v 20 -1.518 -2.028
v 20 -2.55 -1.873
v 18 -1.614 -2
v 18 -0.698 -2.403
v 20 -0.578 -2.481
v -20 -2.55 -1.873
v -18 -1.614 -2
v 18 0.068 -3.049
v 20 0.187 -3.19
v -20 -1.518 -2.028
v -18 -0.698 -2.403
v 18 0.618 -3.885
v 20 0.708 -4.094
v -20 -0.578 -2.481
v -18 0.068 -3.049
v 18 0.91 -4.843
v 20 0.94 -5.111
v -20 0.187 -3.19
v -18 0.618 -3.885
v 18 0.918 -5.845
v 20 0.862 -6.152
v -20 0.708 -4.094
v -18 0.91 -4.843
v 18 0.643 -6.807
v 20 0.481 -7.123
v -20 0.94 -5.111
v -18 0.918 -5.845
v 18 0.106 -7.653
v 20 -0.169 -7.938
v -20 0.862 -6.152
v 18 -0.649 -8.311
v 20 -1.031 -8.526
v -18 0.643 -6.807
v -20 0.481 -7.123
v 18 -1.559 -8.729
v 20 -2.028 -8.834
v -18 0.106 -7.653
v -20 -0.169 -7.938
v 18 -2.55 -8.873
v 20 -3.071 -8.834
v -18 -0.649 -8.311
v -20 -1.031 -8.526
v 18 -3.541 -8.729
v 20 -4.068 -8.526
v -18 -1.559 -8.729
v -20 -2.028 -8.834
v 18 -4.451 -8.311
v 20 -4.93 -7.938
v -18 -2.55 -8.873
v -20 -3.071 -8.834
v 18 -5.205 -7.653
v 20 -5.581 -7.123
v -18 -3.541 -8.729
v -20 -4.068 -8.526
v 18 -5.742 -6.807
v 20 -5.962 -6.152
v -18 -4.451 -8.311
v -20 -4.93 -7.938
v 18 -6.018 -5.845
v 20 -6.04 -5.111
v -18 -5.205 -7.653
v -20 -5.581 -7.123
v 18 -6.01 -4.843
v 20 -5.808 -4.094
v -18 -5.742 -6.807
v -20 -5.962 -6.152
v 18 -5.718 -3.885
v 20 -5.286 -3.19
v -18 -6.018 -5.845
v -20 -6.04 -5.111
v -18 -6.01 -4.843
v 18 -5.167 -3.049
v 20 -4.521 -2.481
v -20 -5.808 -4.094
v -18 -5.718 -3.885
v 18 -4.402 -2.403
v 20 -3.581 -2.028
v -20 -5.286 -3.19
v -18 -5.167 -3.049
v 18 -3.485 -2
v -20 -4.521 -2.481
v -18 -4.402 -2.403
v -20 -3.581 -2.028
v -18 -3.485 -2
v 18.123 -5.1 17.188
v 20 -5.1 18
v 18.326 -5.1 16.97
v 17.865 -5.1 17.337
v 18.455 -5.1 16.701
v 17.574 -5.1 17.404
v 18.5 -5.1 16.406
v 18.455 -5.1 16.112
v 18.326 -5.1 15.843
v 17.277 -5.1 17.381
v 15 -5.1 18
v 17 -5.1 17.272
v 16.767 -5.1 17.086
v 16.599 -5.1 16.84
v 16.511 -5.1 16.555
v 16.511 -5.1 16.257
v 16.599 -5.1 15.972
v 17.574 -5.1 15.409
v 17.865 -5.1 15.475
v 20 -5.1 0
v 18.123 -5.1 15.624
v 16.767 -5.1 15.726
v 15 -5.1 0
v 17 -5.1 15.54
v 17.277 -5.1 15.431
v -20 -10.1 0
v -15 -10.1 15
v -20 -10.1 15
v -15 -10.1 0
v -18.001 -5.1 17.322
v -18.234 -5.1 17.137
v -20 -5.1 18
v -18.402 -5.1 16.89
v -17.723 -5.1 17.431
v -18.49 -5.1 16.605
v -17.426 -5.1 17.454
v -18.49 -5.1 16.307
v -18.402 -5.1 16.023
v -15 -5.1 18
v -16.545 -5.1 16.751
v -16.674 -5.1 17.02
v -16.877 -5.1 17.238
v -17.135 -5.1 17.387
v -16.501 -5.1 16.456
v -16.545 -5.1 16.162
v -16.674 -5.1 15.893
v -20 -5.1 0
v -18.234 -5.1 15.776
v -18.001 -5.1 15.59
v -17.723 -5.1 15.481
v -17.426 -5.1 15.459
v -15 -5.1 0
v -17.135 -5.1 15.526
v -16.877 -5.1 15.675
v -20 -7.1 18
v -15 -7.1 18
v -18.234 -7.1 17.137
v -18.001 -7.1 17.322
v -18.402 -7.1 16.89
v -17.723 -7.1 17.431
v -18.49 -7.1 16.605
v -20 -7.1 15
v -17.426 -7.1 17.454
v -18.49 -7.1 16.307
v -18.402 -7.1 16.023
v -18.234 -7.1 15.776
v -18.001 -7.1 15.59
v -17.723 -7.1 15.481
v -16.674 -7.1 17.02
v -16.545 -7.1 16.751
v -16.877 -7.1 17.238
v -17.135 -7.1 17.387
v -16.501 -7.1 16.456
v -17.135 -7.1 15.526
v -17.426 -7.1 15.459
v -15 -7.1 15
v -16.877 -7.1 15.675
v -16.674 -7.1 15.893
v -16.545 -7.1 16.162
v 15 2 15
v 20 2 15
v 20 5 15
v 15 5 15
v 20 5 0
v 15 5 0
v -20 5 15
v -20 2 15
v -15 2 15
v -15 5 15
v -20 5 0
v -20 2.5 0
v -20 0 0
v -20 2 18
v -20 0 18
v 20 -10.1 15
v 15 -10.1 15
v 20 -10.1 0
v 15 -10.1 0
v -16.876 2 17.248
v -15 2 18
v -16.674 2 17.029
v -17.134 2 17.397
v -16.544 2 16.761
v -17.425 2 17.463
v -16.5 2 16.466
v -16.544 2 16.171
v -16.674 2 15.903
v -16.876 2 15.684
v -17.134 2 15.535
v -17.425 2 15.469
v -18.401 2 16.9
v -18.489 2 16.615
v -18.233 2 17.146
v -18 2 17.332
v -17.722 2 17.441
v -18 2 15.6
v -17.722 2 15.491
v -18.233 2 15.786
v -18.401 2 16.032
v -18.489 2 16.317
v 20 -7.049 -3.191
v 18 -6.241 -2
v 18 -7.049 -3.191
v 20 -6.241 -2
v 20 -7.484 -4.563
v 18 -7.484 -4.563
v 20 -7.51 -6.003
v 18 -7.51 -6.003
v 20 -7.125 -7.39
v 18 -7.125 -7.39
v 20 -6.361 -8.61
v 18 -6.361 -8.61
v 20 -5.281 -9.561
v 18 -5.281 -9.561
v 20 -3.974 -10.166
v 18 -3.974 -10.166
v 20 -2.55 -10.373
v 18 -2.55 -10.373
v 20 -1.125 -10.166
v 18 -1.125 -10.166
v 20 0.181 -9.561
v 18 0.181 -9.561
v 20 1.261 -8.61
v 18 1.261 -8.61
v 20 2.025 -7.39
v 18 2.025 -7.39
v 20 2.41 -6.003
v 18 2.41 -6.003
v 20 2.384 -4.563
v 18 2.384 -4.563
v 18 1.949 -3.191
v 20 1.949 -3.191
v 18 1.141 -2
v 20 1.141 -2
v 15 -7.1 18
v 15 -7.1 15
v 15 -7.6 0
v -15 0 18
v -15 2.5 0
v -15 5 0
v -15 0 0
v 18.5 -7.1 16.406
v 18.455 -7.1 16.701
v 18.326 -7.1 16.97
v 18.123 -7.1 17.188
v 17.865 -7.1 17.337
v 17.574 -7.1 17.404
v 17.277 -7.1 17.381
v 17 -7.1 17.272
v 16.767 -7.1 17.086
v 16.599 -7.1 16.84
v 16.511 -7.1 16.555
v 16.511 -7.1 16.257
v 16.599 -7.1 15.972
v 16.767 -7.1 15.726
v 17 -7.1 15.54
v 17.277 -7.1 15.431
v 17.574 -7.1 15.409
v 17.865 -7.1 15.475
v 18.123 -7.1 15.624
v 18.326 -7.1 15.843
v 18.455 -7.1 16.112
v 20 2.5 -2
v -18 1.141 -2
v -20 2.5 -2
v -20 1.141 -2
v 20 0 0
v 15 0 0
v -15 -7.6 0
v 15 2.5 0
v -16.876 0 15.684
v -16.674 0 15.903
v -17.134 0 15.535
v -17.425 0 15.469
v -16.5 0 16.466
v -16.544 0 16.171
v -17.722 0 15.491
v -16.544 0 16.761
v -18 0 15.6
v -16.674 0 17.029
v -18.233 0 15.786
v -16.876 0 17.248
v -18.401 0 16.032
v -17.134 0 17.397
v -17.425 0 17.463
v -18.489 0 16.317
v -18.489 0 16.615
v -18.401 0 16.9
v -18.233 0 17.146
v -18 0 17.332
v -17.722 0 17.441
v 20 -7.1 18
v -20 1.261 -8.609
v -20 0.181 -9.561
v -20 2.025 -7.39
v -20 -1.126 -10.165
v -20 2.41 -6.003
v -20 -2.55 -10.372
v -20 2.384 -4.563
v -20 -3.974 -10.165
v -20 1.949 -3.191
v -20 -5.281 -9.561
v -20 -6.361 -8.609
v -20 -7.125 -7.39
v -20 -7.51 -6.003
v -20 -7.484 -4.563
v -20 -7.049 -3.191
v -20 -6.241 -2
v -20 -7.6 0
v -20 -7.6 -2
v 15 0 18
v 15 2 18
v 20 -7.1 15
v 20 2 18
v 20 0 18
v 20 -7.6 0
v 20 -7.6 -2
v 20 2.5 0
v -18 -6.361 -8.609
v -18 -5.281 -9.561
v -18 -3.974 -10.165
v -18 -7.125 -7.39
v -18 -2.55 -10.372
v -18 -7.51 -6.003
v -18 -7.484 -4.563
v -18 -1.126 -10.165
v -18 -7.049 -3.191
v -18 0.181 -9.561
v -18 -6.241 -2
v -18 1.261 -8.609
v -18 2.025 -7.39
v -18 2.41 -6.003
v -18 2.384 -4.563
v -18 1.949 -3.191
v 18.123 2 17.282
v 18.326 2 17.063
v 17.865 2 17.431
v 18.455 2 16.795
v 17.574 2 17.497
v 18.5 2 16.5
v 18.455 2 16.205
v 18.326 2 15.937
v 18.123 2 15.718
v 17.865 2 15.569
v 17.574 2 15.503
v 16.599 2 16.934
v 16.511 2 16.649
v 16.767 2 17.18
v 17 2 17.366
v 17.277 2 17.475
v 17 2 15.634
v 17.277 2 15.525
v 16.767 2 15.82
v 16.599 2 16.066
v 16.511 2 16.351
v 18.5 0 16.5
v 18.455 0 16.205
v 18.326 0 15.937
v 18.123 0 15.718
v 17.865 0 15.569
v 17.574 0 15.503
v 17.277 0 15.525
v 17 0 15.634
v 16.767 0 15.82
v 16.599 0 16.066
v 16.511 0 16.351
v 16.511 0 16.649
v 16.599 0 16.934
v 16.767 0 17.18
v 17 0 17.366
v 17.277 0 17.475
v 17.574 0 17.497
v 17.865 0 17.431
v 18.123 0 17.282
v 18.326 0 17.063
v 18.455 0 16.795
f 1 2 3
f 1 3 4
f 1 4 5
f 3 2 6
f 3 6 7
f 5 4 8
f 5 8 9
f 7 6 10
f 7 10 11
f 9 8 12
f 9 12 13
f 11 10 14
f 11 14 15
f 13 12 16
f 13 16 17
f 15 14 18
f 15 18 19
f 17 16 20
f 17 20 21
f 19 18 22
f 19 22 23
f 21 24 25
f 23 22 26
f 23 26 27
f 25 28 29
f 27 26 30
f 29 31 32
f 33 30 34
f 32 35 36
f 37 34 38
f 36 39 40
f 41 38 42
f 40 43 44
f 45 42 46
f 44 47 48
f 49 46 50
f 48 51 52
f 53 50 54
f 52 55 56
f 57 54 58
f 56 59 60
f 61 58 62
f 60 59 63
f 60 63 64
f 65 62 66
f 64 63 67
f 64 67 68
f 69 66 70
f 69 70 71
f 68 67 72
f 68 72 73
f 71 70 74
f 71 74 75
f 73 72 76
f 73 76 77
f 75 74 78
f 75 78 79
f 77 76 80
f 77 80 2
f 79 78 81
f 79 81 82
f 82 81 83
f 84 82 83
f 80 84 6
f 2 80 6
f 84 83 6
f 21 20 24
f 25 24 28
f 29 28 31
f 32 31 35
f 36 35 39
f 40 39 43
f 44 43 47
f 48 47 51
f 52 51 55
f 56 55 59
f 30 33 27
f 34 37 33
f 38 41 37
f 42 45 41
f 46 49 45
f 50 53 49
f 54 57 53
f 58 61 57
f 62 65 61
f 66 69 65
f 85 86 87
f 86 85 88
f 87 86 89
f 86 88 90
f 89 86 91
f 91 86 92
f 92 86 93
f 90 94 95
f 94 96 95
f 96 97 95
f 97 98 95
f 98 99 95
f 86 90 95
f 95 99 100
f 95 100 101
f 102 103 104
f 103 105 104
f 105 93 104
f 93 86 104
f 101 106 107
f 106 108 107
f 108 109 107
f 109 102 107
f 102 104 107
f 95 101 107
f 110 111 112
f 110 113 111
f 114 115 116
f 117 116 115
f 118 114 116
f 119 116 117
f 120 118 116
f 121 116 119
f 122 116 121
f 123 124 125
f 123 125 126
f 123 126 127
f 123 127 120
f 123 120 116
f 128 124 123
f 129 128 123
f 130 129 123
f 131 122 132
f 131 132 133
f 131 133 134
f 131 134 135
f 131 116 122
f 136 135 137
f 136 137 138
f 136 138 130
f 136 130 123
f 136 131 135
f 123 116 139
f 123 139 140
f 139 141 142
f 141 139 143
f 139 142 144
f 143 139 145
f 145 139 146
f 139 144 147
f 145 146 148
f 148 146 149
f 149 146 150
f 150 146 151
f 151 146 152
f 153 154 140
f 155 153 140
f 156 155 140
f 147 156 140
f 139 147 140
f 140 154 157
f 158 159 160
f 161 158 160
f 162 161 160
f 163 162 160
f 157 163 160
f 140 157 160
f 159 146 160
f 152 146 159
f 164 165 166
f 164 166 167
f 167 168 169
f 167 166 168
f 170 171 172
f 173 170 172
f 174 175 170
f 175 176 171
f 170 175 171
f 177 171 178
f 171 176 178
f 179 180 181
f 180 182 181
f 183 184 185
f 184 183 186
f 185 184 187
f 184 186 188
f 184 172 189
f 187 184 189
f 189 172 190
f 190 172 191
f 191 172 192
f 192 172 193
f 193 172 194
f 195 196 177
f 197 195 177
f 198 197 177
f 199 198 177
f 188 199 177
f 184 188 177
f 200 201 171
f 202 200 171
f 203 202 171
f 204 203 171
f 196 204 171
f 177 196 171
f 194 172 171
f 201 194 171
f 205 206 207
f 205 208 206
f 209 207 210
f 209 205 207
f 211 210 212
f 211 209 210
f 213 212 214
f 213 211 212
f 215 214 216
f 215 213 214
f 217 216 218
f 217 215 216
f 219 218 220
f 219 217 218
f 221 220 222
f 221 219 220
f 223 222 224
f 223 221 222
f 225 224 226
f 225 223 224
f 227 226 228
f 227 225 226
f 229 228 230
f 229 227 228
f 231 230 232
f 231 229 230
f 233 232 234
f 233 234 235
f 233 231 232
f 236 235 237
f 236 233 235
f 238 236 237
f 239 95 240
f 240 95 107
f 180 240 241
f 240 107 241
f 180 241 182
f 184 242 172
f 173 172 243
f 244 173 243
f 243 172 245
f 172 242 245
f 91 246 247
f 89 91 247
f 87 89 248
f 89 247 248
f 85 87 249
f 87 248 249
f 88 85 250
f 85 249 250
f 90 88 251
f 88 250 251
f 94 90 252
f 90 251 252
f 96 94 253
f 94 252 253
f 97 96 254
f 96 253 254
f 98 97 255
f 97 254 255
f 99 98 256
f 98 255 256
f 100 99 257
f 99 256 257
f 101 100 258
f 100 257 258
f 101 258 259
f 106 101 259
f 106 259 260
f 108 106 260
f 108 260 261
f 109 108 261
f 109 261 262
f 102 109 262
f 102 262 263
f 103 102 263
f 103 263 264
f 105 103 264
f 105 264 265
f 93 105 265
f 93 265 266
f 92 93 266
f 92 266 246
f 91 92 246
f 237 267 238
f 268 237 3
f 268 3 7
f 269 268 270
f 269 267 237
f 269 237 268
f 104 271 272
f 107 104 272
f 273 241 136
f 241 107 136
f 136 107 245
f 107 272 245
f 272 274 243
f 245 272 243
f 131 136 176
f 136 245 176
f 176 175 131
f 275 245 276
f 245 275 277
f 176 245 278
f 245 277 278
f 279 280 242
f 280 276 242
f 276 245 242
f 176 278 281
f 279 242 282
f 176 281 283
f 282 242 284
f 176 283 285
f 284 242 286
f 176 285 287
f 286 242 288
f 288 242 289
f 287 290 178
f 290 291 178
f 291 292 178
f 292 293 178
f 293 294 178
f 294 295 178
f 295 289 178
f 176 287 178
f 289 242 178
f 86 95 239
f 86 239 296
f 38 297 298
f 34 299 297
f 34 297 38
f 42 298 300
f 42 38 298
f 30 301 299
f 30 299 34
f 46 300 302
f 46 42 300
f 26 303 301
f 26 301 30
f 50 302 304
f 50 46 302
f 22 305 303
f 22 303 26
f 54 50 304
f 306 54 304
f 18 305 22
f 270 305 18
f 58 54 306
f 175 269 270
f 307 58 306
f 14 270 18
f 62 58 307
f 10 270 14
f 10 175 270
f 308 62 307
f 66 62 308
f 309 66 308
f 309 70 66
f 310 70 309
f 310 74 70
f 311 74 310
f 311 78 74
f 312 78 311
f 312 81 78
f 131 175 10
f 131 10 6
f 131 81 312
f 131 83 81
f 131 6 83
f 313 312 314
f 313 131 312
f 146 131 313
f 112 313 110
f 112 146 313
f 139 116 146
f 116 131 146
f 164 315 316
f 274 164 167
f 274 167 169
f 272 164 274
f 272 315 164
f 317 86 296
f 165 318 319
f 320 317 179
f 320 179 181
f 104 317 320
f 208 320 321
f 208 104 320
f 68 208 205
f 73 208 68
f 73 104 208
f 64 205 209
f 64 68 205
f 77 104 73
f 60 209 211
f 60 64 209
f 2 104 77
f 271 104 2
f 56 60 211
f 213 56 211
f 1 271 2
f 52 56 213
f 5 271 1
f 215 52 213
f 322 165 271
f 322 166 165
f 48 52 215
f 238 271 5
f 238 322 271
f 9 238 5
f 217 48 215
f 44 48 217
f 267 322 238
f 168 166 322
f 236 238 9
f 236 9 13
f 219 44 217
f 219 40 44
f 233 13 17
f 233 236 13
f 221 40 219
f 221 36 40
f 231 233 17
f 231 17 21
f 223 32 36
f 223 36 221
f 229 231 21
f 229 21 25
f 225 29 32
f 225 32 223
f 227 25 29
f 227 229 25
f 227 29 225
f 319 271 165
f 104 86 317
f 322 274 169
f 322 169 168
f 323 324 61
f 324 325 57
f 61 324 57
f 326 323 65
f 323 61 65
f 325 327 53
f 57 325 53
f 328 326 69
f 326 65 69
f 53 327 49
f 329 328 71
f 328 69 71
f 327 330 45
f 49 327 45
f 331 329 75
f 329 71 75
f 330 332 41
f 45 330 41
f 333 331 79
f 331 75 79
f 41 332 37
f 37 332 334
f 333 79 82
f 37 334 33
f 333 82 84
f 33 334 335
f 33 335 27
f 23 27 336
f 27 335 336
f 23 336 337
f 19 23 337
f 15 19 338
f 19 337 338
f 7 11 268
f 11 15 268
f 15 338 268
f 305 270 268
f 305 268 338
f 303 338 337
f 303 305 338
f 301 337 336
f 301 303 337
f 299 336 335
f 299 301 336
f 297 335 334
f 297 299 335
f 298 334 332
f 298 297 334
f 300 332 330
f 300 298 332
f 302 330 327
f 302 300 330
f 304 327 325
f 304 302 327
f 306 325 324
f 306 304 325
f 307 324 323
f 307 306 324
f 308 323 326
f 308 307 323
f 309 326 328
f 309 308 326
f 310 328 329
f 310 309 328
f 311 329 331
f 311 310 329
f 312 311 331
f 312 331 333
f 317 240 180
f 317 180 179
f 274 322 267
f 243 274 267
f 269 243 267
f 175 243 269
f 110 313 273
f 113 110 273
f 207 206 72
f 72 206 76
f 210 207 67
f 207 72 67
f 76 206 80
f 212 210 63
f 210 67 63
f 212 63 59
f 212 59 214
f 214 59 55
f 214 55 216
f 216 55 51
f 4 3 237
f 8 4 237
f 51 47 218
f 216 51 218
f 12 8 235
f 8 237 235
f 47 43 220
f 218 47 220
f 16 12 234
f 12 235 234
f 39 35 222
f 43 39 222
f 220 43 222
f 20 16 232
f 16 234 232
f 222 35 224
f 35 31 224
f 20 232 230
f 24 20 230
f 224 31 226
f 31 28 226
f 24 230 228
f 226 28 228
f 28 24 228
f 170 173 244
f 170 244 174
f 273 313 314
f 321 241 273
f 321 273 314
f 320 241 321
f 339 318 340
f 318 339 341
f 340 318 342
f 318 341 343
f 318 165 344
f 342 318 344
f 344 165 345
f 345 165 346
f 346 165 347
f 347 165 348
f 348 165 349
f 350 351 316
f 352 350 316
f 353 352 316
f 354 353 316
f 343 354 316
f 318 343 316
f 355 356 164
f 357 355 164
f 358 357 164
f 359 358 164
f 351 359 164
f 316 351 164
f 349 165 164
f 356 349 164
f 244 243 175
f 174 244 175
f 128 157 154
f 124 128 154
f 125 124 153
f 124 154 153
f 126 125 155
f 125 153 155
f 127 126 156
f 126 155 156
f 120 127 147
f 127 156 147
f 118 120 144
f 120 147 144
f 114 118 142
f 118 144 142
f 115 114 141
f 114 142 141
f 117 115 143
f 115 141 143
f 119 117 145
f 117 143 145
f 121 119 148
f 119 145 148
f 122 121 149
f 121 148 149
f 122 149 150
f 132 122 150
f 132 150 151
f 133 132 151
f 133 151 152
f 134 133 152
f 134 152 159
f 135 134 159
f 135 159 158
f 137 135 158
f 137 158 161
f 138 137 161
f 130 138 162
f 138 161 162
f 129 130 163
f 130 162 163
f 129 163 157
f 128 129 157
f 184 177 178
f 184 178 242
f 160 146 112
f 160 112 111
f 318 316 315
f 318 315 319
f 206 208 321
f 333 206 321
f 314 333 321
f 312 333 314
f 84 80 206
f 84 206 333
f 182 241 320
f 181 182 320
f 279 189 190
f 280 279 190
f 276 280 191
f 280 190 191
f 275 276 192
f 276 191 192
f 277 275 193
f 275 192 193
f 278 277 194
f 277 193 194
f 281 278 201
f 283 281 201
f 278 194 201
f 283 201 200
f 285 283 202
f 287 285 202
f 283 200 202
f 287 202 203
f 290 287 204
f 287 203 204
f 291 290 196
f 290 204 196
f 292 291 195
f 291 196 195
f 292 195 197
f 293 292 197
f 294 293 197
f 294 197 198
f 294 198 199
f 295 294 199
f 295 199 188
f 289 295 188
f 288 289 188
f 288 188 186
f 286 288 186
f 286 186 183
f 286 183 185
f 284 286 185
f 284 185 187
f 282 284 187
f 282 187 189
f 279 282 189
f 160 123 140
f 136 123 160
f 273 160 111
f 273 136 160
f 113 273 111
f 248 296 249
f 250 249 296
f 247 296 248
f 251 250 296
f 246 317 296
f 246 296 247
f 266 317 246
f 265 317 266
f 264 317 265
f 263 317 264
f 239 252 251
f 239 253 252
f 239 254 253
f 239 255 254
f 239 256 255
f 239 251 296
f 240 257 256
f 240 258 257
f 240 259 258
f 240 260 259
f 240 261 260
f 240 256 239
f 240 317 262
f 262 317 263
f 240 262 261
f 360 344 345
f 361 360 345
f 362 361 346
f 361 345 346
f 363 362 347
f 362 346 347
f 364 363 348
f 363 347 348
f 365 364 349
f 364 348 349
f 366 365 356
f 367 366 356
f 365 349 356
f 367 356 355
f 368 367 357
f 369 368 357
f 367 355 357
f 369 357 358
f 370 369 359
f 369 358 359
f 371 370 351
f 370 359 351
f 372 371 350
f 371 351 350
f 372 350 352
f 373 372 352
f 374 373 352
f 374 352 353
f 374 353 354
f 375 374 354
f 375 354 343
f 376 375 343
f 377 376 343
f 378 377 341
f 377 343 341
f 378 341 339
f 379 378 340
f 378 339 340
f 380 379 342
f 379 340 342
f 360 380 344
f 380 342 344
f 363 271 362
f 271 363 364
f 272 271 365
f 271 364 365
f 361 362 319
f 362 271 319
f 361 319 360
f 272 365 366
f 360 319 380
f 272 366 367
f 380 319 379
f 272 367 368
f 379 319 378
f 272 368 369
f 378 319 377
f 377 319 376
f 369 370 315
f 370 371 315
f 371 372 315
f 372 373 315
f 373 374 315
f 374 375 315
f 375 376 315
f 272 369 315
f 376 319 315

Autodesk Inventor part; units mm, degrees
ref_plane "YZ Plane" through (0, 0, 0) normal (1, 0, 0) x (0, 1, 0)
ref_plane "XZ Plane" through (0, 0, 0) normal (0, 1, 0) x (-1, 0, 0)
ref_plane "XY Plane" through (0, 0, 0) normal (0, 0, 1) x (1, 0, 0)
sketch "Sketch3" plane through (0, 0, 0) normal (0, 1, 0) x (-1, 0, 0)
  line L0 (-14.9997, 0) -> (-19.9997, 0)
  line L1 (-19.9997, 0) -> (-19.9997, 15)
  line L2 (-19.9997, 15) -> (-14.9997, 15)
  line L3 (-14.9997, 15) -> (-14.9997, 0)
  line L4 (14.9998, 0) -> (19.9998, 0)
  line L5 (19.9998, 0) -> (19.9998, 15)
  line L6 (19.9998, 15) -> (14.9998, 15)
  line L7 (14.9998, 15) -> (14.9998, 0)
  point P0 (0, 0)
  dimension "d4" = 5
  dimension "d5" = 15
  dimension "d6" = 5
  dimension "d7" = 15
extrude "Extrusion1" add sketch "Sketch3" along normal blind 5
sketch "Sketch5" plane through (-19.9998, 0, 15) normal (0, 0, 1) x (1, 0, 0)
  line L0 (5, 0) -> (0, 0) projected
  line L1 (0, 0) -> (5, 0)
  line L2 (5, 0) -> (5, 2)
  line L3 (5, 2) -> (0, 2)
  line L4 (0, 2) -> (0, 0)
  line L5 (34.9995, 0) -> (39.9995, 0) projected
  line L6 (34.9995, 0) -> (39.9995, 0)
  line L7 (39.9995, 0) -> (39.9995, 2)
  line L8 (39.9995, 2) -> (34.9995, 2)
  line L9 (34.9995, 2) -> (34.9995, 0)
  point P0 (19.9998, 0)
  dimension "d10" = 5
  dimension "d11" = 2
  dimension "d12" = 5
  dimension "d13" = 2
extrude "Extrusion2" add sketch "Sketch5" along normal blind 3
sketch "Sketch6" plane through (-19.9998, 2, 15) normal (0, 1, 0) x (1, 0, 0)
  point P0 (19.9998, 15)
sketch "Sketch7" plane through (-19.9998, 2, 15) normal (0, 1, 0) x (1, 0, 0)
  circle A0 centre (2.5, -1.466) radius 1
  line L0 (0, 0) -> (0, -3) projected
  circle A1 centre (37.4995, -1.5) radius 1
  line L1 (34.9995, 0) -> (34.9995, -3) projected
  point P0 (19.9998, 15)
  point P1 (0, -1.5)
  point P2 (34.9995, -1.5)
  dimension "d16" = 2
  dimension "d17" = 2.5
  dimension "d18" = 2
  dimension "d19" = 2.5
extrude "Extrusion3" cut sketch "Sketch7" against normal blind 2
sketch "Sketch8" plane through (19.9997, 0, 0) normal (0, 0, -1) x (-1, 0, 0)
  line L0 (0, 2) -> (0, 5) projected
  line L1 (0, 2.5002) -> (40, 2.5002)
  line L2 (40, 2.5002) -> (40, -7.5998)
  line L3 (40, -7.5998) -> (0, -7.5998)
  line L4 (0, -7.5998) -> (0, 2.5002)
  point P0 (19.9997, 0)
  dimension "d22" = 40
  dimension "d23" = 10.1
extrude "Extrusion4" add sketch "Sketch8" along normal blind 2
sketch "Sketch9" plane through (19.9997, 0, 0) normal (0, 0, 1) x (1, 0, 0)
  line L0 (-40, -7.5998) -> (-40, 2.5002) projected
  line L1 (-40, -5.1) -> (-35, -5.1)
  line L2 (-35, -5.1) -> (-35, -10.1)
  line L3 (-35, -10.1) -> (-40, -10.1)
  line L4 (-40, -10.1) -> (-40, -5.1)
  line L5 (0, 0) -> (0, -7.5998) projected
  line L6 (0, -5.1) -> (-5, -5.1)
  line L7 (-5, -5.1) -> (-5, -10.1)
  line L8 (-5, -10.1) -> (0, -10.1)
  line L9 (0, -10.1) -> (0, -5.1)
  point P0 (-19.9997, 0)
  dimension "d26" = 5
  dimension "d27" = 5
  dimension "d28" = 5
  dimension "d29" = 5
extrude "Extrusion5" add sketch "Sketch9" along normal blind 15
sketch "Sketch10" plane through (19.9997, 0, 15) normal (0, 0, 1) x (1, 0, 0)
  line L0 (-35, -5.1) -> (-40, -5.1)
  line L1 (-40, -5.1) -> (-40, -7.1)
  line L2 (-40, -7.1) -> (-35, -7.1)
  line L3 (-35, -7.1) -> (-35, -5.1)
  line L4 (-5, -5.1) -> (-5, -10.1) projected
  line L5 (-5, -5.1) -> (0, -5.1)
  line L6 (0, -5.1) -> (0, -7.1)
  line L7 (0, -7.1) -> (-5, -7.1)
  line L8 (-5, -7.1) -> (-5, -5.1)
  point P0 (-19.9997, 0)
  dimension "d32" = 5
  dimension "d33" = 2
  dimension "d34" = 5
  dimension "d35" = 2
extrude "Extrusion6" add sketch "Sketch10" along normal blind 3
sketch "Sketch11" plane through (-20.0003, -7.1, 15) normal (0, -1, 0) x (1, 0, 0)
  circle A0 centre (2.4996, 1.4564) radius 1
  line L0 (0, 0) -> (0, 3) projected
  circle A1 centre (37.5, 1.4063) radius 1
  line L1 (40, 0) -> (40, 3) projected
  point P0 (20.0003, -15)
  point P1 (0, 1.5)
  point P2 (40, 1.5)
  dimension "d38" = 2
  dimension "d39" = 2.5
  dimension "d40" = 2
  dimension "d41" = 2.5
extrude "Extrusion7" cut sketch "Sketch11" against normal blind 2
sketch "Sketch13" plane through (19.9997, 5, 15) normal (1, 0, 0) x (0, 0, -1)
  circle A0 centre (20.3727, -7.5498) radius 5
  point P0 (15, -5)
  dimension "d44" = 10
extrude "Extrusion8" add sketch "Sketch13" against normal blind 2
sketch "Sketch14" plane through (17.9997, 5, 15) normal (-1, 0, 0) x (0, 0, 1)
  arc A0 (-17, -3.8586) -> (-17, -11.241) centre (-20.3727, -7.5498) ccw projected
  point P0 (-15, -5)
sketch "Sketch15" plane through (-20.0003, -7.5998, -2) normal (-1, 0, 0) x (0, 0, 1)
  point P0 (2, 7.5998)
sketch "Sketch16" plane through (-20.0003, -7.5998, -2) normal (-1, 0, 0) x (0, 0, 1)
  circle A0 centre (-3.3725, 5.0498) radius 5
  point P0 (2, 7.5998)
  dimension "d47" = 10
extrude "Extrusion9" add sketch "Sketch16" against normal blind 2
sketch "Sketch18" plane through (-20.0003, 2.5002, -2) normal (-1, 0, 0) x (0, 0, 1)
  arc A0 (0, -1.3588) -> (0, -8.7412) centre (-3.3727, -5.05) ccw projected
  circle A1 centre (-3.3727, -5.05) radius 3.5
  point P0 (2, -2.5002)
  dimension "d50" = 7
extrude "Extrusion10" cut sketch "Sketch18" against normal blind 40
properties part number "mount"
